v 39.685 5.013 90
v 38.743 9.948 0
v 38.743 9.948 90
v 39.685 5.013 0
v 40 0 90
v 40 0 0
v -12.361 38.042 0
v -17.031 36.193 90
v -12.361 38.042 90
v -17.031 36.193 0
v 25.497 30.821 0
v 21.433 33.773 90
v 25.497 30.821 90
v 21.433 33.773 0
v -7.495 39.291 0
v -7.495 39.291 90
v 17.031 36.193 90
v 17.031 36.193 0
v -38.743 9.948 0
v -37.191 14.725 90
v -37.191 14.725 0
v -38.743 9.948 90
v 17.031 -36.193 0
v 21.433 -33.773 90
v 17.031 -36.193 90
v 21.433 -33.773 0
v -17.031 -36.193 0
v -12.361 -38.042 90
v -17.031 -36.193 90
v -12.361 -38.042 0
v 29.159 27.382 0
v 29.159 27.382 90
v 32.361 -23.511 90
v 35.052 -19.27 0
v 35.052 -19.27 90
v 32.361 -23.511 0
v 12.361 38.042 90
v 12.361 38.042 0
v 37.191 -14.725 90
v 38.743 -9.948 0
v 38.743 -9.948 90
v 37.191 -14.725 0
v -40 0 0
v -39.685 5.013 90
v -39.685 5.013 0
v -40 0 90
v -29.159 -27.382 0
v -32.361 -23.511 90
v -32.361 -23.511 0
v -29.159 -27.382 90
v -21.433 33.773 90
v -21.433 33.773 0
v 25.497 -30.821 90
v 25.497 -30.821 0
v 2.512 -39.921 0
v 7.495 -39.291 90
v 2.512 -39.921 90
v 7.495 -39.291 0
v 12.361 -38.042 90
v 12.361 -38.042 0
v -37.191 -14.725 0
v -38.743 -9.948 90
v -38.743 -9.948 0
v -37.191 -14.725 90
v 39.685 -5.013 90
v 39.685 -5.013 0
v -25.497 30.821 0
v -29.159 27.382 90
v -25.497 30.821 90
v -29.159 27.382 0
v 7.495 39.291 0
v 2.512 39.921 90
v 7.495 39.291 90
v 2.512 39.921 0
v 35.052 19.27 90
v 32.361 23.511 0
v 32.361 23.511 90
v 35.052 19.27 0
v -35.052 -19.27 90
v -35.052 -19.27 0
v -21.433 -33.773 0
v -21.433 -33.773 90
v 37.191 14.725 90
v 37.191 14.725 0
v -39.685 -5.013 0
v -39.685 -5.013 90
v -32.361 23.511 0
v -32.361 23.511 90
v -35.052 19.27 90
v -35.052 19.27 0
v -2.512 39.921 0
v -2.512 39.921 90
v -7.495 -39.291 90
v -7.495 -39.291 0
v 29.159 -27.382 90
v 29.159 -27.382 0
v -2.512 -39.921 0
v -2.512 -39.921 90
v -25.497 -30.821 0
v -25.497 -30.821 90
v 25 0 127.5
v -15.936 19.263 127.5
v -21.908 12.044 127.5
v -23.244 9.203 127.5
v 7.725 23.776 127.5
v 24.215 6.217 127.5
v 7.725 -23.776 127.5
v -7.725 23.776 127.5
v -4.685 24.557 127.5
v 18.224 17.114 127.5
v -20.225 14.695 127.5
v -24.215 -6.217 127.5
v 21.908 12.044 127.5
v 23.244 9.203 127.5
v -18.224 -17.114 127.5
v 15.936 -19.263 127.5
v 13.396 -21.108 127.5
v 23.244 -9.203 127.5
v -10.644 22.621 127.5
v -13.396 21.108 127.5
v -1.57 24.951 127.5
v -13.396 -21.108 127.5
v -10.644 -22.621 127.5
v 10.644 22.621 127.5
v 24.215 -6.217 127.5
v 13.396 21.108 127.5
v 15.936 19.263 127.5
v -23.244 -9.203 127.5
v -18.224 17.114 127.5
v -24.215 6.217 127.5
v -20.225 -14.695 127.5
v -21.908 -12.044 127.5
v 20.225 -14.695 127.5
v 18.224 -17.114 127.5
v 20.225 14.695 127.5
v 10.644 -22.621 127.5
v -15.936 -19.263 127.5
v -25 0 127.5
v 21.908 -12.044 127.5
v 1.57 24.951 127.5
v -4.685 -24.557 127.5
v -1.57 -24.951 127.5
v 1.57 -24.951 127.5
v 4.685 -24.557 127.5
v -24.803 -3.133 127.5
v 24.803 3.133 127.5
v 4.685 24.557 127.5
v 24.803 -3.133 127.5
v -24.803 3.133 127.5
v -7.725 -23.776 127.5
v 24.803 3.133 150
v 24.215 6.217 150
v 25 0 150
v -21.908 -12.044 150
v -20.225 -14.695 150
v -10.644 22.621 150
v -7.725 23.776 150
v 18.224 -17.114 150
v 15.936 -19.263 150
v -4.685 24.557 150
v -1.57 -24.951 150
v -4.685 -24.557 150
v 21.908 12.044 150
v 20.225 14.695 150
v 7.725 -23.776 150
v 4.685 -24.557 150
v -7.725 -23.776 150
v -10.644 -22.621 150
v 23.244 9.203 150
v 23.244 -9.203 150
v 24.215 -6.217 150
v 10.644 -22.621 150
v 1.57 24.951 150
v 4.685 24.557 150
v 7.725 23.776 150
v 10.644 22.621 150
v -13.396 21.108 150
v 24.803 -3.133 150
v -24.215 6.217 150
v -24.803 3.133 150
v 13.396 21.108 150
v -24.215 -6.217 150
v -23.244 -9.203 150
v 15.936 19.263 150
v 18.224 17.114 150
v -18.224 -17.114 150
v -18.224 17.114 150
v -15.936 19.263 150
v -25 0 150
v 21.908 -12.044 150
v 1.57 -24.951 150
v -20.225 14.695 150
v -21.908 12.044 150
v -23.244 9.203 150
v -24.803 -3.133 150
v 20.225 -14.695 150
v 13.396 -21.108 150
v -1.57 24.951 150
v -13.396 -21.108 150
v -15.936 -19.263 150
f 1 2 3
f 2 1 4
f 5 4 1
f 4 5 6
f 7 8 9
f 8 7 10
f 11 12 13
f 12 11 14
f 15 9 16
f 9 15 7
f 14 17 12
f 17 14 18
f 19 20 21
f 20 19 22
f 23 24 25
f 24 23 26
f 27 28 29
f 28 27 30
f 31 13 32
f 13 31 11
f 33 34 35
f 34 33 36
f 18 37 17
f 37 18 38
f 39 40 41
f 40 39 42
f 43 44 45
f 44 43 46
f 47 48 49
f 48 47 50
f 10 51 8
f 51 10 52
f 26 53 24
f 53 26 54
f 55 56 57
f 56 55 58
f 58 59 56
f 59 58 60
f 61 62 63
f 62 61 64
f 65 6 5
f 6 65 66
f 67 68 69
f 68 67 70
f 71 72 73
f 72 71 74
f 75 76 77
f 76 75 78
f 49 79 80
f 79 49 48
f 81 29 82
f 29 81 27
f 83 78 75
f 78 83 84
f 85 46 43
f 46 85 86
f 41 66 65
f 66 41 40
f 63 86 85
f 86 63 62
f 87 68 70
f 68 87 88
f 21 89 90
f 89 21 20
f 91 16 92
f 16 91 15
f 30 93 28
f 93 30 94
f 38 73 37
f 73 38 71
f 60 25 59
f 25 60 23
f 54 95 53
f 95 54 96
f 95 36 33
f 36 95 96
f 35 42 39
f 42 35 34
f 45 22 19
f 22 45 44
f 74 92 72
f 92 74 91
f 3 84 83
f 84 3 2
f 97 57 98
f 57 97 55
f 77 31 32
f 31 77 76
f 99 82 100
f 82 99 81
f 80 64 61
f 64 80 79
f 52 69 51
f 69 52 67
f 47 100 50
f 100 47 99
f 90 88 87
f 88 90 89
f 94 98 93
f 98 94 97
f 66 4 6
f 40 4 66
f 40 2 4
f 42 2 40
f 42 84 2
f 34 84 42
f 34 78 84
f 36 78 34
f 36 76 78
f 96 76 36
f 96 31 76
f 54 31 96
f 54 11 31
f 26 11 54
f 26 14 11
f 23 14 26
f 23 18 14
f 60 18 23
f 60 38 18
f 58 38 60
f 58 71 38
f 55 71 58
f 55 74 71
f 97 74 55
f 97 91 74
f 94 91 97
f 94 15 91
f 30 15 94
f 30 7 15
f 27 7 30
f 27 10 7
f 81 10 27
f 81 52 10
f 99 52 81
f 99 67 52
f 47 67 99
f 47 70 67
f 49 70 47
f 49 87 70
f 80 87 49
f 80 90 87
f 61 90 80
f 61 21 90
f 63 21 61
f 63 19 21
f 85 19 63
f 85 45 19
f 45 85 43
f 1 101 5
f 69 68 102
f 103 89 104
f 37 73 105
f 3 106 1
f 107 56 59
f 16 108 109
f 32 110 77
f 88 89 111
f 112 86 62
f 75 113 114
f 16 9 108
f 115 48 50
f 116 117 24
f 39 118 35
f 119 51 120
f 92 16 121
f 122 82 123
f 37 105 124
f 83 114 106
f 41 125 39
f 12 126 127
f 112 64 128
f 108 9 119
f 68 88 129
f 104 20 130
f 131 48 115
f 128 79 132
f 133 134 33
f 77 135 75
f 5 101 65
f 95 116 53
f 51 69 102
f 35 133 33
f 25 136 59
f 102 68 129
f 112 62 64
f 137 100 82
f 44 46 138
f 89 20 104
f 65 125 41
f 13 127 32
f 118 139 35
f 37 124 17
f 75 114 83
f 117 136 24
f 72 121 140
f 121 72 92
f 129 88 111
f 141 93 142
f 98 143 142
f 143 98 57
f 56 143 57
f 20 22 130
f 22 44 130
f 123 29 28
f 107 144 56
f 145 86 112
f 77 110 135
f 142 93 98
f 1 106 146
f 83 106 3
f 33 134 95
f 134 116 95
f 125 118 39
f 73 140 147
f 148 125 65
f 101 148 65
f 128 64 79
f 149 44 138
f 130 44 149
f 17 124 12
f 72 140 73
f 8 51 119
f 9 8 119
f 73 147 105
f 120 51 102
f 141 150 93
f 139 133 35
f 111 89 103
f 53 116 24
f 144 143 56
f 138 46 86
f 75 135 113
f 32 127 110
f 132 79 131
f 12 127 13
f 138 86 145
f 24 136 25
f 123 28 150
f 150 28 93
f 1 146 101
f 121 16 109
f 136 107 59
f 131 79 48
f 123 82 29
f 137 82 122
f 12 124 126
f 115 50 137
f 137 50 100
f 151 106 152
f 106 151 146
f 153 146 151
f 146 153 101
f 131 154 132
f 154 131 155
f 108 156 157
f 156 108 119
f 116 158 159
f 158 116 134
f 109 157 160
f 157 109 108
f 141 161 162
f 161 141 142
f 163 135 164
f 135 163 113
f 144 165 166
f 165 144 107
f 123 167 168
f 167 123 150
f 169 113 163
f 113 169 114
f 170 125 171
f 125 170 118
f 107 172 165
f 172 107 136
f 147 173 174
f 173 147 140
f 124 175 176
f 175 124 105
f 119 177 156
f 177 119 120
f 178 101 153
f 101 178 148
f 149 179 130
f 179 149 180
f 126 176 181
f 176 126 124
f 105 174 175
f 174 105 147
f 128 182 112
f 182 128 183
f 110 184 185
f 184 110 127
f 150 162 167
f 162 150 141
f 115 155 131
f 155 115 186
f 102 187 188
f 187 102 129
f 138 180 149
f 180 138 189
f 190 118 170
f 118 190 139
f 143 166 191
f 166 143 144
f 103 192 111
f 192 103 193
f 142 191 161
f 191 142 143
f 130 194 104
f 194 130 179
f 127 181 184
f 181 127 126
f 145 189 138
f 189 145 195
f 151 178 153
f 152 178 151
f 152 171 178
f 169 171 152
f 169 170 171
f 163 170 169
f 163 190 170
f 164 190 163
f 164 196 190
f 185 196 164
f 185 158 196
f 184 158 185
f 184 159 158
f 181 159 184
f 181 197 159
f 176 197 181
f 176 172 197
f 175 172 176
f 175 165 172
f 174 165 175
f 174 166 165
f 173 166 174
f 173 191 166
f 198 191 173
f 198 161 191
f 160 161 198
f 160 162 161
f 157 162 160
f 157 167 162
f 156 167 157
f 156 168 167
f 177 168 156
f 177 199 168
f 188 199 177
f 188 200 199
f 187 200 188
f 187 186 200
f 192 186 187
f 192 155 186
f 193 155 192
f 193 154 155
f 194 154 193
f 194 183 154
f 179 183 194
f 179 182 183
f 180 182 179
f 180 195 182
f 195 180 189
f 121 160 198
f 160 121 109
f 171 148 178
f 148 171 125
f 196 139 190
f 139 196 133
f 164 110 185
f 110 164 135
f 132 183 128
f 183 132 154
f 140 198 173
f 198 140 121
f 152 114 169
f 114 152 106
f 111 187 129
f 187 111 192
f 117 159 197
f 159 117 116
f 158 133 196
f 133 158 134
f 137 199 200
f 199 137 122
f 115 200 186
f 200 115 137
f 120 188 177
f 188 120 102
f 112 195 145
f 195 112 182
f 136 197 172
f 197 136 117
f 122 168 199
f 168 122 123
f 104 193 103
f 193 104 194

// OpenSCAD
/* openSCAD basic bottle example for vorgmindset */

//these are parameters you can set via customizer

/* [Dimensions] */
wallThck=1.2;
height=150;
baseDia=80;
neckDia=50;

/* [Hidden] */
fudge=0.1;
baseHght=height*0.6;
neckHght=height*0.15;
$fn=50;


cylinder(d=baseDia,h=baseHght);
translate([0,0,baseHght]) cylinder(d1=baseDia,d2=neckDia,h=height-baseHght-neckHght);
translate([0,0,height-neckHght]) cylinder(d=neckDia,h=neckHght);
